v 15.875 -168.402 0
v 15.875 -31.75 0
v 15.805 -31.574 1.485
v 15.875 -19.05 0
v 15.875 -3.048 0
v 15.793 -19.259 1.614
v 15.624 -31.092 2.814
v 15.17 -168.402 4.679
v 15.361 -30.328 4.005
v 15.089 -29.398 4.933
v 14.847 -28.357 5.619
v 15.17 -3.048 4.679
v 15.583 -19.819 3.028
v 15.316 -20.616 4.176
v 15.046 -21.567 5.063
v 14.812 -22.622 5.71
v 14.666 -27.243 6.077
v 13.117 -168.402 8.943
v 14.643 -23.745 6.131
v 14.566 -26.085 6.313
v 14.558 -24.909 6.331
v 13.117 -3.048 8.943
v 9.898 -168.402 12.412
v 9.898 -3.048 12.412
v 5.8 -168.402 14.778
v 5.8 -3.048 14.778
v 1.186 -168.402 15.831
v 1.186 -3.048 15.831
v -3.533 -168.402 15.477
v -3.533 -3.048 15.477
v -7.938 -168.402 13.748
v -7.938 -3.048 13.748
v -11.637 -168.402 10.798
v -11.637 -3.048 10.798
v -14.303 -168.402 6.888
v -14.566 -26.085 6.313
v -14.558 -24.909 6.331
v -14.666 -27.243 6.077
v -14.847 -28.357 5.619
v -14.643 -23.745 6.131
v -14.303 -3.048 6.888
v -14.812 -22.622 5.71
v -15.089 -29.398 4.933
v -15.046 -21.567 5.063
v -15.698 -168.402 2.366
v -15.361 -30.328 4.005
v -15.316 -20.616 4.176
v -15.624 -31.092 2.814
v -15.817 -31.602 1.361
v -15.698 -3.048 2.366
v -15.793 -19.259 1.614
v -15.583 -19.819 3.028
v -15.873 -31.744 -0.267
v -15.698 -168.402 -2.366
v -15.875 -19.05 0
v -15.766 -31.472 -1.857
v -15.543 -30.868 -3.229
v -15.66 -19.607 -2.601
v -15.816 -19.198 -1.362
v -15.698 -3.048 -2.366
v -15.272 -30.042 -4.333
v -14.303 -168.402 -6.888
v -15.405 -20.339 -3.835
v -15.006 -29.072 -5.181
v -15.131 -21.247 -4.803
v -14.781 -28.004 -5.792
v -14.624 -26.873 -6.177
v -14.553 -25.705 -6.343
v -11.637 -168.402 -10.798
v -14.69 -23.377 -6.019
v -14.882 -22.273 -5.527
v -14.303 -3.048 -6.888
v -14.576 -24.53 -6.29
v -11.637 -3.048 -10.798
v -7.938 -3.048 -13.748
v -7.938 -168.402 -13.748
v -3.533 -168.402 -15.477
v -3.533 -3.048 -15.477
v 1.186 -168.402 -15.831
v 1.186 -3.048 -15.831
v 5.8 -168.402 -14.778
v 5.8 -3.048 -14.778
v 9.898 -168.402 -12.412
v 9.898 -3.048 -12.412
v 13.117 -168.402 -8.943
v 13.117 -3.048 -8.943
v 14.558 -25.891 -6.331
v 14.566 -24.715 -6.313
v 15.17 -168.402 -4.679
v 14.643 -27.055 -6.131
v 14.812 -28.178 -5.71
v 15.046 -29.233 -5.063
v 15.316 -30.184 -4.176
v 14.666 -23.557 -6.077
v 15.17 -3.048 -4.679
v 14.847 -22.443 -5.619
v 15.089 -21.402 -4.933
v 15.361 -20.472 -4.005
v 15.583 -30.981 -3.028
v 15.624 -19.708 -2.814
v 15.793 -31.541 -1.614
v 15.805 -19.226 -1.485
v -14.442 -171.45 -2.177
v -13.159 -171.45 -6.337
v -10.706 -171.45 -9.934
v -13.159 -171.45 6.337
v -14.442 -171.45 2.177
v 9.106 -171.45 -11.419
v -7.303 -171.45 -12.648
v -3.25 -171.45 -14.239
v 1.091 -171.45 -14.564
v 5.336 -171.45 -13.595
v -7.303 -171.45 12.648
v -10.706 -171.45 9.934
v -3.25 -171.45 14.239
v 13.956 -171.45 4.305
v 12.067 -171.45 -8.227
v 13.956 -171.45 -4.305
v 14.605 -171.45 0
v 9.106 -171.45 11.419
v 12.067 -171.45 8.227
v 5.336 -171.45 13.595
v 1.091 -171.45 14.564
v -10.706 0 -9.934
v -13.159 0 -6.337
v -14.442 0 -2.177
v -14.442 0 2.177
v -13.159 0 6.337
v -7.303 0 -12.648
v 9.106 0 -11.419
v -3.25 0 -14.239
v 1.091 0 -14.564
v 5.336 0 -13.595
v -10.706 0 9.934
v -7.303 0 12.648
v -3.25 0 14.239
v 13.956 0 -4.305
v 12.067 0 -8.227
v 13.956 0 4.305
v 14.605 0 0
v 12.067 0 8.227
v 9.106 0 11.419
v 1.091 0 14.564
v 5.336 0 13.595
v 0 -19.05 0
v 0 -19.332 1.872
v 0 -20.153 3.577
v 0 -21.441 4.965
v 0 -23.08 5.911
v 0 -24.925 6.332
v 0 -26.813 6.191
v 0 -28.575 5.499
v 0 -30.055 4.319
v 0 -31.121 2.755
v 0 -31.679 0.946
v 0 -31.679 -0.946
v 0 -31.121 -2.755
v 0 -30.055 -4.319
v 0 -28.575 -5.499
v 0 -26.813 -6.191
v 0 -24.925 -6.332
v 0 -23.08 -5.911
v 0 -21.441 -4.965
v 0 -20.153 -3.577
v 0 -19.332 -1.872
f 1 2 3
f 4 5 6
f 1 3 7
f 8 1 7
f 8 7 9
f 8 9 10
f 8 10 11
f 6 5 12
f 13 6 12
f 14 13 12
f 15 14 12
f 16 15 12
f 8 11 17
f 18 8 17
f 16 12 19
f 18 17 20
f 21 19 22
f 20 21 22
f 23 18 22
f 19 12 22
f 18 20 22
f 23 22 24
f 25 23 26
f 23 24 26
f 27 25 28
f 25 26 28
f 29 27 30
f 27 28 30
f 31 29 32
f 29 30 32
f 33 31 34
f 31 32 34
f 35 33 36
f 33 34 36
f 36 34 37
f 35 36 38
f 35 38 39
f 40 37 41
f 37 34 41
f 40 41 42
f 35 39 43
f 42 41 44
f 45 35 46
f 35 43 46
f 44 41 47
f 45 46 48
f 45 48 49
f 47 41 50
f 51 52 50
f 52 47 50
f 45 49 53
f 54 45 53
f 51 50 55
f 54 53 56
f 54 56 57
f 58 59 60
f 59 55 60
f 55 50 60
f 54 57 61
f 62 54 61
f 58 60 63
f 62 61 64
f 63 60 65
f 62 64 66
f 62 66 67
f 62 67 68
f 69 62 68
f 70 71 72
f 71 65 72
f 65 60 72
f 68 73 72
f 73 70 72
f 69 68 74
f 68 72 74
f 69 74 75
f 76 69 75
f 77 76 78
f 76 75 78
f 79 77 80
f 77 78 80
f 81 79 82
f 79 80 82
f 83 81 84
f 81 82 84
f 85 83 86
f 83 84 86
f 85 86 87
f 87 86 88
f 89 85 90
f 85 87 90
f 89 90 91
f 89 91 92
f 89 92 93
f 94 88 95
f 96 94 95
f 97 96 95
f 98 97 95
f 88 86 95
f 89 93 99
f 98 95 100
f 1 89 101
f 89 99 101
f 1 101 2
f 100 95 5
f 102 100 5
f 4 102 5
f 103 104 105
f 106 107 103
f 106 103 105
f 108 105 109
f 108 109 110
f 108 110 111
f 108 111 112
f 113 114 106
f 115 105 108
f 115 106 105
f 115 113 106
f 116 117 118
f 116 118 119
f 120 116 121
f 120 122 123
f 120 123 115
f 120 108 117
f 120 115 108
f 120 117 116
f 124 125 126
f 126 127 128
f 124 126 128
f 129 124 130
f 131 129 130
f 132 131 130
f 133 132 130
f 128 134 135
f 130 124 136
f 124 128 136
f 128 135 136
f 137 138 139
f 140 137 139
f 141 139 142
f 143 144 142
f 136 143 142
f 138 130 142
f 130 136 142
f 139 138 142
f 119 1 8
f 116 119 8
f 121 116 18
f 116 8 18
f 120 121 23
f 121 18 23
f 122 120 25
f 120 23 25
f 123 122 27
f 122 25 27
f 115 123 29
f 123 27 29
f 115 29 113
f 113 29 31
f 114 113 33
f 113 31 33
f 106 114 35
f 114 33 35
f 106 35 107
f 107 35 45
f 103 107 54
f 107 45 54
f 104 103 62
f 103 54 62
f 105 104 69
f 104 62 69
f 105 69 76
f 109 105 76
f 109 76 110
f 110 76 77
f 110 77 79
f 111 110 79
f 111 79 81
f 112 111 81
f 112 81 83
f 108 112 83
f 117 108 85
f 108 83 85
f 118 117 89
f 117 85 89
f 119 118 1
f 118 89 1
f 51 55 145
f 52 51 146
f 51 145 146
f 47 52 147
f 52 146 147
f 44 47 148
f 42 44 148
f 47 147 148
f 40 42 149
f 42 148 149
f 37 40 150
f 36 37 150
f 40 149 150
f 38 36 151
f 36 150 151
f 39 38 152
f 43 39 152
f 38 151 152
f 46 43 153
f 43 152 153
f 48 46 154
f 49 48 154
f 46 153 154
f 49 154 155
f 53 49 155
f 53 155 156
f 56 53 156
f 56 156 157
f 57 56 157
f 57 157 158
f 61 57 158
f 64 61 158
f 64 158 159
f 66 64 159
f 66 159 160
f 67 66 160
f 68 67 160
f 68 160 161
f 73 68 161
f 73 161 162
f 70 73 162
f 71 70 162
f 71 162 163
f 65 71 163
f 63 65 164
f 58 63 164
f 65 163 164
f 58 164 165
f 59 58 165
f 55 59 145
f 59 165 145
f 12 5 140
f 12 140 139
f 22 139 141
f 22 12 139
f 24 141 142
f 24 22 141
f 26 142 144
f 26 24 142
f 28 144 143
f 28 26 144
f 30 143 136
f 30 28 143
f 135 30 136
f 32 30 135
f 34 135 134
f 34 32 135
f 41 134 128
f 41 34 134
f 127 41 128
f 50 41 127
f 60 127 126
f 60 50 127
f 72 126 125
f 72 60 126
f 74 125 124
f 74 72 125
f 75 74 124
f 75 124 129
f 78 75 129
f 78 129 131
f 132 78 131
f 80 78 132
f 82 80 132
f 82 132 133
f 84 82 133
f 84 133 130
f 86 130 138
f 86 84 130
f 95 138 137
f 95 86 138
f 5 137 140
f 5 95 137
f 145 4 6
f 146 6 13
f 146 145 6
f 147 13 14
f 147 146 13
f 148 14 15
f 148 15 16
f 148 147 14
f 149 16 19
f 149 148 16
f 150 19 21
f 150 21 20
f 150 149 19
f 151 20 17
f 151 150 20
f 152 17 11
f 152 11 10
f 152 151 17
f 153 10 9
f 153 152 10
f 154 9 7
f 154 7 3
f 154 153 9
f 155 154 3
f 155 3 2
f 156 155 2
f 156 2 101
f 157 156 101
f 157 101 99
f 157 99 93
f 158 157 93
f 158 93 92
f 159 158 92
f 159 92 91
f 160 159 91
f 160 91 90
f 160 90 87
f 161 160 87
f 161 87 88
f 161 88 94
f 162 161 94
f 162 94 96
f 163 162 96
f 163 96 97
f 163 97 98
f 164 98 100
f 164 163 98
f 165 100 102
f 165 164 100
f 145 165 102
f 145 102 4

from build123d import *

# Parameters (mm, degrees)
F0_R     = 15.875
F1_DEPTH = 171.45
F2_R     = 6.35
F3_DEPTH = 25.4
F4_DEPTH = 25.4
F5_SIZE2 = 3.048
F5_SIZE  = 1.27
F6_SIZE2 = 3.048
F6_SIZE  = 1.27


with BuildPart() as f1:
    # F0 (on Front) → F1 (new body)
    with BuildSketch(Plane.XZ):
        Circle(F0_R)
    extrude(amount=F1_DEPTH)

    # F2 (on Right) → F3 (cut)
    with BuildSketch(Plane.YZ):
        with Locations((-25.4, 0)):
            Circle(F2_R)
    extrude(amount=-F3_DEPTH, mode=Mode.SUBTRACT)

    # F4 (cut): a face of the model
    f4_faces = [f1.faces().sort_by_distance(p)[0] for p in [
        (0, -25.4, 0),
    ]]
    extrude(f4_faces, amount=-F4_DEPTH, mode=Mode.SUBTRACT)

    # F5
    f5_edges = [f1.edges().sort_by_distance(p)[0] for p in [
        (-15.875, -171.45, 0),
    ]]
    f5_side = f1.faces().sort_by_distance((0, -171.45, 0))[0]
    chamfer(f5_edges, length=F5_SIZE, length2=F5_SIZE2, reference=f5_side)

    # F6
    f6_edges = [f1.edges().sort_by_distance(p)[0] for p in [
        (-15.875, 0, 0),
    ]]
    f6_side = f1.faces().sort_by_distance((0, 0, 0))[0]
    chamfer(f6_edges, length=F6_SIZE, length2=F6_SIZE2, reference=f6_side)


solid = f1.part
